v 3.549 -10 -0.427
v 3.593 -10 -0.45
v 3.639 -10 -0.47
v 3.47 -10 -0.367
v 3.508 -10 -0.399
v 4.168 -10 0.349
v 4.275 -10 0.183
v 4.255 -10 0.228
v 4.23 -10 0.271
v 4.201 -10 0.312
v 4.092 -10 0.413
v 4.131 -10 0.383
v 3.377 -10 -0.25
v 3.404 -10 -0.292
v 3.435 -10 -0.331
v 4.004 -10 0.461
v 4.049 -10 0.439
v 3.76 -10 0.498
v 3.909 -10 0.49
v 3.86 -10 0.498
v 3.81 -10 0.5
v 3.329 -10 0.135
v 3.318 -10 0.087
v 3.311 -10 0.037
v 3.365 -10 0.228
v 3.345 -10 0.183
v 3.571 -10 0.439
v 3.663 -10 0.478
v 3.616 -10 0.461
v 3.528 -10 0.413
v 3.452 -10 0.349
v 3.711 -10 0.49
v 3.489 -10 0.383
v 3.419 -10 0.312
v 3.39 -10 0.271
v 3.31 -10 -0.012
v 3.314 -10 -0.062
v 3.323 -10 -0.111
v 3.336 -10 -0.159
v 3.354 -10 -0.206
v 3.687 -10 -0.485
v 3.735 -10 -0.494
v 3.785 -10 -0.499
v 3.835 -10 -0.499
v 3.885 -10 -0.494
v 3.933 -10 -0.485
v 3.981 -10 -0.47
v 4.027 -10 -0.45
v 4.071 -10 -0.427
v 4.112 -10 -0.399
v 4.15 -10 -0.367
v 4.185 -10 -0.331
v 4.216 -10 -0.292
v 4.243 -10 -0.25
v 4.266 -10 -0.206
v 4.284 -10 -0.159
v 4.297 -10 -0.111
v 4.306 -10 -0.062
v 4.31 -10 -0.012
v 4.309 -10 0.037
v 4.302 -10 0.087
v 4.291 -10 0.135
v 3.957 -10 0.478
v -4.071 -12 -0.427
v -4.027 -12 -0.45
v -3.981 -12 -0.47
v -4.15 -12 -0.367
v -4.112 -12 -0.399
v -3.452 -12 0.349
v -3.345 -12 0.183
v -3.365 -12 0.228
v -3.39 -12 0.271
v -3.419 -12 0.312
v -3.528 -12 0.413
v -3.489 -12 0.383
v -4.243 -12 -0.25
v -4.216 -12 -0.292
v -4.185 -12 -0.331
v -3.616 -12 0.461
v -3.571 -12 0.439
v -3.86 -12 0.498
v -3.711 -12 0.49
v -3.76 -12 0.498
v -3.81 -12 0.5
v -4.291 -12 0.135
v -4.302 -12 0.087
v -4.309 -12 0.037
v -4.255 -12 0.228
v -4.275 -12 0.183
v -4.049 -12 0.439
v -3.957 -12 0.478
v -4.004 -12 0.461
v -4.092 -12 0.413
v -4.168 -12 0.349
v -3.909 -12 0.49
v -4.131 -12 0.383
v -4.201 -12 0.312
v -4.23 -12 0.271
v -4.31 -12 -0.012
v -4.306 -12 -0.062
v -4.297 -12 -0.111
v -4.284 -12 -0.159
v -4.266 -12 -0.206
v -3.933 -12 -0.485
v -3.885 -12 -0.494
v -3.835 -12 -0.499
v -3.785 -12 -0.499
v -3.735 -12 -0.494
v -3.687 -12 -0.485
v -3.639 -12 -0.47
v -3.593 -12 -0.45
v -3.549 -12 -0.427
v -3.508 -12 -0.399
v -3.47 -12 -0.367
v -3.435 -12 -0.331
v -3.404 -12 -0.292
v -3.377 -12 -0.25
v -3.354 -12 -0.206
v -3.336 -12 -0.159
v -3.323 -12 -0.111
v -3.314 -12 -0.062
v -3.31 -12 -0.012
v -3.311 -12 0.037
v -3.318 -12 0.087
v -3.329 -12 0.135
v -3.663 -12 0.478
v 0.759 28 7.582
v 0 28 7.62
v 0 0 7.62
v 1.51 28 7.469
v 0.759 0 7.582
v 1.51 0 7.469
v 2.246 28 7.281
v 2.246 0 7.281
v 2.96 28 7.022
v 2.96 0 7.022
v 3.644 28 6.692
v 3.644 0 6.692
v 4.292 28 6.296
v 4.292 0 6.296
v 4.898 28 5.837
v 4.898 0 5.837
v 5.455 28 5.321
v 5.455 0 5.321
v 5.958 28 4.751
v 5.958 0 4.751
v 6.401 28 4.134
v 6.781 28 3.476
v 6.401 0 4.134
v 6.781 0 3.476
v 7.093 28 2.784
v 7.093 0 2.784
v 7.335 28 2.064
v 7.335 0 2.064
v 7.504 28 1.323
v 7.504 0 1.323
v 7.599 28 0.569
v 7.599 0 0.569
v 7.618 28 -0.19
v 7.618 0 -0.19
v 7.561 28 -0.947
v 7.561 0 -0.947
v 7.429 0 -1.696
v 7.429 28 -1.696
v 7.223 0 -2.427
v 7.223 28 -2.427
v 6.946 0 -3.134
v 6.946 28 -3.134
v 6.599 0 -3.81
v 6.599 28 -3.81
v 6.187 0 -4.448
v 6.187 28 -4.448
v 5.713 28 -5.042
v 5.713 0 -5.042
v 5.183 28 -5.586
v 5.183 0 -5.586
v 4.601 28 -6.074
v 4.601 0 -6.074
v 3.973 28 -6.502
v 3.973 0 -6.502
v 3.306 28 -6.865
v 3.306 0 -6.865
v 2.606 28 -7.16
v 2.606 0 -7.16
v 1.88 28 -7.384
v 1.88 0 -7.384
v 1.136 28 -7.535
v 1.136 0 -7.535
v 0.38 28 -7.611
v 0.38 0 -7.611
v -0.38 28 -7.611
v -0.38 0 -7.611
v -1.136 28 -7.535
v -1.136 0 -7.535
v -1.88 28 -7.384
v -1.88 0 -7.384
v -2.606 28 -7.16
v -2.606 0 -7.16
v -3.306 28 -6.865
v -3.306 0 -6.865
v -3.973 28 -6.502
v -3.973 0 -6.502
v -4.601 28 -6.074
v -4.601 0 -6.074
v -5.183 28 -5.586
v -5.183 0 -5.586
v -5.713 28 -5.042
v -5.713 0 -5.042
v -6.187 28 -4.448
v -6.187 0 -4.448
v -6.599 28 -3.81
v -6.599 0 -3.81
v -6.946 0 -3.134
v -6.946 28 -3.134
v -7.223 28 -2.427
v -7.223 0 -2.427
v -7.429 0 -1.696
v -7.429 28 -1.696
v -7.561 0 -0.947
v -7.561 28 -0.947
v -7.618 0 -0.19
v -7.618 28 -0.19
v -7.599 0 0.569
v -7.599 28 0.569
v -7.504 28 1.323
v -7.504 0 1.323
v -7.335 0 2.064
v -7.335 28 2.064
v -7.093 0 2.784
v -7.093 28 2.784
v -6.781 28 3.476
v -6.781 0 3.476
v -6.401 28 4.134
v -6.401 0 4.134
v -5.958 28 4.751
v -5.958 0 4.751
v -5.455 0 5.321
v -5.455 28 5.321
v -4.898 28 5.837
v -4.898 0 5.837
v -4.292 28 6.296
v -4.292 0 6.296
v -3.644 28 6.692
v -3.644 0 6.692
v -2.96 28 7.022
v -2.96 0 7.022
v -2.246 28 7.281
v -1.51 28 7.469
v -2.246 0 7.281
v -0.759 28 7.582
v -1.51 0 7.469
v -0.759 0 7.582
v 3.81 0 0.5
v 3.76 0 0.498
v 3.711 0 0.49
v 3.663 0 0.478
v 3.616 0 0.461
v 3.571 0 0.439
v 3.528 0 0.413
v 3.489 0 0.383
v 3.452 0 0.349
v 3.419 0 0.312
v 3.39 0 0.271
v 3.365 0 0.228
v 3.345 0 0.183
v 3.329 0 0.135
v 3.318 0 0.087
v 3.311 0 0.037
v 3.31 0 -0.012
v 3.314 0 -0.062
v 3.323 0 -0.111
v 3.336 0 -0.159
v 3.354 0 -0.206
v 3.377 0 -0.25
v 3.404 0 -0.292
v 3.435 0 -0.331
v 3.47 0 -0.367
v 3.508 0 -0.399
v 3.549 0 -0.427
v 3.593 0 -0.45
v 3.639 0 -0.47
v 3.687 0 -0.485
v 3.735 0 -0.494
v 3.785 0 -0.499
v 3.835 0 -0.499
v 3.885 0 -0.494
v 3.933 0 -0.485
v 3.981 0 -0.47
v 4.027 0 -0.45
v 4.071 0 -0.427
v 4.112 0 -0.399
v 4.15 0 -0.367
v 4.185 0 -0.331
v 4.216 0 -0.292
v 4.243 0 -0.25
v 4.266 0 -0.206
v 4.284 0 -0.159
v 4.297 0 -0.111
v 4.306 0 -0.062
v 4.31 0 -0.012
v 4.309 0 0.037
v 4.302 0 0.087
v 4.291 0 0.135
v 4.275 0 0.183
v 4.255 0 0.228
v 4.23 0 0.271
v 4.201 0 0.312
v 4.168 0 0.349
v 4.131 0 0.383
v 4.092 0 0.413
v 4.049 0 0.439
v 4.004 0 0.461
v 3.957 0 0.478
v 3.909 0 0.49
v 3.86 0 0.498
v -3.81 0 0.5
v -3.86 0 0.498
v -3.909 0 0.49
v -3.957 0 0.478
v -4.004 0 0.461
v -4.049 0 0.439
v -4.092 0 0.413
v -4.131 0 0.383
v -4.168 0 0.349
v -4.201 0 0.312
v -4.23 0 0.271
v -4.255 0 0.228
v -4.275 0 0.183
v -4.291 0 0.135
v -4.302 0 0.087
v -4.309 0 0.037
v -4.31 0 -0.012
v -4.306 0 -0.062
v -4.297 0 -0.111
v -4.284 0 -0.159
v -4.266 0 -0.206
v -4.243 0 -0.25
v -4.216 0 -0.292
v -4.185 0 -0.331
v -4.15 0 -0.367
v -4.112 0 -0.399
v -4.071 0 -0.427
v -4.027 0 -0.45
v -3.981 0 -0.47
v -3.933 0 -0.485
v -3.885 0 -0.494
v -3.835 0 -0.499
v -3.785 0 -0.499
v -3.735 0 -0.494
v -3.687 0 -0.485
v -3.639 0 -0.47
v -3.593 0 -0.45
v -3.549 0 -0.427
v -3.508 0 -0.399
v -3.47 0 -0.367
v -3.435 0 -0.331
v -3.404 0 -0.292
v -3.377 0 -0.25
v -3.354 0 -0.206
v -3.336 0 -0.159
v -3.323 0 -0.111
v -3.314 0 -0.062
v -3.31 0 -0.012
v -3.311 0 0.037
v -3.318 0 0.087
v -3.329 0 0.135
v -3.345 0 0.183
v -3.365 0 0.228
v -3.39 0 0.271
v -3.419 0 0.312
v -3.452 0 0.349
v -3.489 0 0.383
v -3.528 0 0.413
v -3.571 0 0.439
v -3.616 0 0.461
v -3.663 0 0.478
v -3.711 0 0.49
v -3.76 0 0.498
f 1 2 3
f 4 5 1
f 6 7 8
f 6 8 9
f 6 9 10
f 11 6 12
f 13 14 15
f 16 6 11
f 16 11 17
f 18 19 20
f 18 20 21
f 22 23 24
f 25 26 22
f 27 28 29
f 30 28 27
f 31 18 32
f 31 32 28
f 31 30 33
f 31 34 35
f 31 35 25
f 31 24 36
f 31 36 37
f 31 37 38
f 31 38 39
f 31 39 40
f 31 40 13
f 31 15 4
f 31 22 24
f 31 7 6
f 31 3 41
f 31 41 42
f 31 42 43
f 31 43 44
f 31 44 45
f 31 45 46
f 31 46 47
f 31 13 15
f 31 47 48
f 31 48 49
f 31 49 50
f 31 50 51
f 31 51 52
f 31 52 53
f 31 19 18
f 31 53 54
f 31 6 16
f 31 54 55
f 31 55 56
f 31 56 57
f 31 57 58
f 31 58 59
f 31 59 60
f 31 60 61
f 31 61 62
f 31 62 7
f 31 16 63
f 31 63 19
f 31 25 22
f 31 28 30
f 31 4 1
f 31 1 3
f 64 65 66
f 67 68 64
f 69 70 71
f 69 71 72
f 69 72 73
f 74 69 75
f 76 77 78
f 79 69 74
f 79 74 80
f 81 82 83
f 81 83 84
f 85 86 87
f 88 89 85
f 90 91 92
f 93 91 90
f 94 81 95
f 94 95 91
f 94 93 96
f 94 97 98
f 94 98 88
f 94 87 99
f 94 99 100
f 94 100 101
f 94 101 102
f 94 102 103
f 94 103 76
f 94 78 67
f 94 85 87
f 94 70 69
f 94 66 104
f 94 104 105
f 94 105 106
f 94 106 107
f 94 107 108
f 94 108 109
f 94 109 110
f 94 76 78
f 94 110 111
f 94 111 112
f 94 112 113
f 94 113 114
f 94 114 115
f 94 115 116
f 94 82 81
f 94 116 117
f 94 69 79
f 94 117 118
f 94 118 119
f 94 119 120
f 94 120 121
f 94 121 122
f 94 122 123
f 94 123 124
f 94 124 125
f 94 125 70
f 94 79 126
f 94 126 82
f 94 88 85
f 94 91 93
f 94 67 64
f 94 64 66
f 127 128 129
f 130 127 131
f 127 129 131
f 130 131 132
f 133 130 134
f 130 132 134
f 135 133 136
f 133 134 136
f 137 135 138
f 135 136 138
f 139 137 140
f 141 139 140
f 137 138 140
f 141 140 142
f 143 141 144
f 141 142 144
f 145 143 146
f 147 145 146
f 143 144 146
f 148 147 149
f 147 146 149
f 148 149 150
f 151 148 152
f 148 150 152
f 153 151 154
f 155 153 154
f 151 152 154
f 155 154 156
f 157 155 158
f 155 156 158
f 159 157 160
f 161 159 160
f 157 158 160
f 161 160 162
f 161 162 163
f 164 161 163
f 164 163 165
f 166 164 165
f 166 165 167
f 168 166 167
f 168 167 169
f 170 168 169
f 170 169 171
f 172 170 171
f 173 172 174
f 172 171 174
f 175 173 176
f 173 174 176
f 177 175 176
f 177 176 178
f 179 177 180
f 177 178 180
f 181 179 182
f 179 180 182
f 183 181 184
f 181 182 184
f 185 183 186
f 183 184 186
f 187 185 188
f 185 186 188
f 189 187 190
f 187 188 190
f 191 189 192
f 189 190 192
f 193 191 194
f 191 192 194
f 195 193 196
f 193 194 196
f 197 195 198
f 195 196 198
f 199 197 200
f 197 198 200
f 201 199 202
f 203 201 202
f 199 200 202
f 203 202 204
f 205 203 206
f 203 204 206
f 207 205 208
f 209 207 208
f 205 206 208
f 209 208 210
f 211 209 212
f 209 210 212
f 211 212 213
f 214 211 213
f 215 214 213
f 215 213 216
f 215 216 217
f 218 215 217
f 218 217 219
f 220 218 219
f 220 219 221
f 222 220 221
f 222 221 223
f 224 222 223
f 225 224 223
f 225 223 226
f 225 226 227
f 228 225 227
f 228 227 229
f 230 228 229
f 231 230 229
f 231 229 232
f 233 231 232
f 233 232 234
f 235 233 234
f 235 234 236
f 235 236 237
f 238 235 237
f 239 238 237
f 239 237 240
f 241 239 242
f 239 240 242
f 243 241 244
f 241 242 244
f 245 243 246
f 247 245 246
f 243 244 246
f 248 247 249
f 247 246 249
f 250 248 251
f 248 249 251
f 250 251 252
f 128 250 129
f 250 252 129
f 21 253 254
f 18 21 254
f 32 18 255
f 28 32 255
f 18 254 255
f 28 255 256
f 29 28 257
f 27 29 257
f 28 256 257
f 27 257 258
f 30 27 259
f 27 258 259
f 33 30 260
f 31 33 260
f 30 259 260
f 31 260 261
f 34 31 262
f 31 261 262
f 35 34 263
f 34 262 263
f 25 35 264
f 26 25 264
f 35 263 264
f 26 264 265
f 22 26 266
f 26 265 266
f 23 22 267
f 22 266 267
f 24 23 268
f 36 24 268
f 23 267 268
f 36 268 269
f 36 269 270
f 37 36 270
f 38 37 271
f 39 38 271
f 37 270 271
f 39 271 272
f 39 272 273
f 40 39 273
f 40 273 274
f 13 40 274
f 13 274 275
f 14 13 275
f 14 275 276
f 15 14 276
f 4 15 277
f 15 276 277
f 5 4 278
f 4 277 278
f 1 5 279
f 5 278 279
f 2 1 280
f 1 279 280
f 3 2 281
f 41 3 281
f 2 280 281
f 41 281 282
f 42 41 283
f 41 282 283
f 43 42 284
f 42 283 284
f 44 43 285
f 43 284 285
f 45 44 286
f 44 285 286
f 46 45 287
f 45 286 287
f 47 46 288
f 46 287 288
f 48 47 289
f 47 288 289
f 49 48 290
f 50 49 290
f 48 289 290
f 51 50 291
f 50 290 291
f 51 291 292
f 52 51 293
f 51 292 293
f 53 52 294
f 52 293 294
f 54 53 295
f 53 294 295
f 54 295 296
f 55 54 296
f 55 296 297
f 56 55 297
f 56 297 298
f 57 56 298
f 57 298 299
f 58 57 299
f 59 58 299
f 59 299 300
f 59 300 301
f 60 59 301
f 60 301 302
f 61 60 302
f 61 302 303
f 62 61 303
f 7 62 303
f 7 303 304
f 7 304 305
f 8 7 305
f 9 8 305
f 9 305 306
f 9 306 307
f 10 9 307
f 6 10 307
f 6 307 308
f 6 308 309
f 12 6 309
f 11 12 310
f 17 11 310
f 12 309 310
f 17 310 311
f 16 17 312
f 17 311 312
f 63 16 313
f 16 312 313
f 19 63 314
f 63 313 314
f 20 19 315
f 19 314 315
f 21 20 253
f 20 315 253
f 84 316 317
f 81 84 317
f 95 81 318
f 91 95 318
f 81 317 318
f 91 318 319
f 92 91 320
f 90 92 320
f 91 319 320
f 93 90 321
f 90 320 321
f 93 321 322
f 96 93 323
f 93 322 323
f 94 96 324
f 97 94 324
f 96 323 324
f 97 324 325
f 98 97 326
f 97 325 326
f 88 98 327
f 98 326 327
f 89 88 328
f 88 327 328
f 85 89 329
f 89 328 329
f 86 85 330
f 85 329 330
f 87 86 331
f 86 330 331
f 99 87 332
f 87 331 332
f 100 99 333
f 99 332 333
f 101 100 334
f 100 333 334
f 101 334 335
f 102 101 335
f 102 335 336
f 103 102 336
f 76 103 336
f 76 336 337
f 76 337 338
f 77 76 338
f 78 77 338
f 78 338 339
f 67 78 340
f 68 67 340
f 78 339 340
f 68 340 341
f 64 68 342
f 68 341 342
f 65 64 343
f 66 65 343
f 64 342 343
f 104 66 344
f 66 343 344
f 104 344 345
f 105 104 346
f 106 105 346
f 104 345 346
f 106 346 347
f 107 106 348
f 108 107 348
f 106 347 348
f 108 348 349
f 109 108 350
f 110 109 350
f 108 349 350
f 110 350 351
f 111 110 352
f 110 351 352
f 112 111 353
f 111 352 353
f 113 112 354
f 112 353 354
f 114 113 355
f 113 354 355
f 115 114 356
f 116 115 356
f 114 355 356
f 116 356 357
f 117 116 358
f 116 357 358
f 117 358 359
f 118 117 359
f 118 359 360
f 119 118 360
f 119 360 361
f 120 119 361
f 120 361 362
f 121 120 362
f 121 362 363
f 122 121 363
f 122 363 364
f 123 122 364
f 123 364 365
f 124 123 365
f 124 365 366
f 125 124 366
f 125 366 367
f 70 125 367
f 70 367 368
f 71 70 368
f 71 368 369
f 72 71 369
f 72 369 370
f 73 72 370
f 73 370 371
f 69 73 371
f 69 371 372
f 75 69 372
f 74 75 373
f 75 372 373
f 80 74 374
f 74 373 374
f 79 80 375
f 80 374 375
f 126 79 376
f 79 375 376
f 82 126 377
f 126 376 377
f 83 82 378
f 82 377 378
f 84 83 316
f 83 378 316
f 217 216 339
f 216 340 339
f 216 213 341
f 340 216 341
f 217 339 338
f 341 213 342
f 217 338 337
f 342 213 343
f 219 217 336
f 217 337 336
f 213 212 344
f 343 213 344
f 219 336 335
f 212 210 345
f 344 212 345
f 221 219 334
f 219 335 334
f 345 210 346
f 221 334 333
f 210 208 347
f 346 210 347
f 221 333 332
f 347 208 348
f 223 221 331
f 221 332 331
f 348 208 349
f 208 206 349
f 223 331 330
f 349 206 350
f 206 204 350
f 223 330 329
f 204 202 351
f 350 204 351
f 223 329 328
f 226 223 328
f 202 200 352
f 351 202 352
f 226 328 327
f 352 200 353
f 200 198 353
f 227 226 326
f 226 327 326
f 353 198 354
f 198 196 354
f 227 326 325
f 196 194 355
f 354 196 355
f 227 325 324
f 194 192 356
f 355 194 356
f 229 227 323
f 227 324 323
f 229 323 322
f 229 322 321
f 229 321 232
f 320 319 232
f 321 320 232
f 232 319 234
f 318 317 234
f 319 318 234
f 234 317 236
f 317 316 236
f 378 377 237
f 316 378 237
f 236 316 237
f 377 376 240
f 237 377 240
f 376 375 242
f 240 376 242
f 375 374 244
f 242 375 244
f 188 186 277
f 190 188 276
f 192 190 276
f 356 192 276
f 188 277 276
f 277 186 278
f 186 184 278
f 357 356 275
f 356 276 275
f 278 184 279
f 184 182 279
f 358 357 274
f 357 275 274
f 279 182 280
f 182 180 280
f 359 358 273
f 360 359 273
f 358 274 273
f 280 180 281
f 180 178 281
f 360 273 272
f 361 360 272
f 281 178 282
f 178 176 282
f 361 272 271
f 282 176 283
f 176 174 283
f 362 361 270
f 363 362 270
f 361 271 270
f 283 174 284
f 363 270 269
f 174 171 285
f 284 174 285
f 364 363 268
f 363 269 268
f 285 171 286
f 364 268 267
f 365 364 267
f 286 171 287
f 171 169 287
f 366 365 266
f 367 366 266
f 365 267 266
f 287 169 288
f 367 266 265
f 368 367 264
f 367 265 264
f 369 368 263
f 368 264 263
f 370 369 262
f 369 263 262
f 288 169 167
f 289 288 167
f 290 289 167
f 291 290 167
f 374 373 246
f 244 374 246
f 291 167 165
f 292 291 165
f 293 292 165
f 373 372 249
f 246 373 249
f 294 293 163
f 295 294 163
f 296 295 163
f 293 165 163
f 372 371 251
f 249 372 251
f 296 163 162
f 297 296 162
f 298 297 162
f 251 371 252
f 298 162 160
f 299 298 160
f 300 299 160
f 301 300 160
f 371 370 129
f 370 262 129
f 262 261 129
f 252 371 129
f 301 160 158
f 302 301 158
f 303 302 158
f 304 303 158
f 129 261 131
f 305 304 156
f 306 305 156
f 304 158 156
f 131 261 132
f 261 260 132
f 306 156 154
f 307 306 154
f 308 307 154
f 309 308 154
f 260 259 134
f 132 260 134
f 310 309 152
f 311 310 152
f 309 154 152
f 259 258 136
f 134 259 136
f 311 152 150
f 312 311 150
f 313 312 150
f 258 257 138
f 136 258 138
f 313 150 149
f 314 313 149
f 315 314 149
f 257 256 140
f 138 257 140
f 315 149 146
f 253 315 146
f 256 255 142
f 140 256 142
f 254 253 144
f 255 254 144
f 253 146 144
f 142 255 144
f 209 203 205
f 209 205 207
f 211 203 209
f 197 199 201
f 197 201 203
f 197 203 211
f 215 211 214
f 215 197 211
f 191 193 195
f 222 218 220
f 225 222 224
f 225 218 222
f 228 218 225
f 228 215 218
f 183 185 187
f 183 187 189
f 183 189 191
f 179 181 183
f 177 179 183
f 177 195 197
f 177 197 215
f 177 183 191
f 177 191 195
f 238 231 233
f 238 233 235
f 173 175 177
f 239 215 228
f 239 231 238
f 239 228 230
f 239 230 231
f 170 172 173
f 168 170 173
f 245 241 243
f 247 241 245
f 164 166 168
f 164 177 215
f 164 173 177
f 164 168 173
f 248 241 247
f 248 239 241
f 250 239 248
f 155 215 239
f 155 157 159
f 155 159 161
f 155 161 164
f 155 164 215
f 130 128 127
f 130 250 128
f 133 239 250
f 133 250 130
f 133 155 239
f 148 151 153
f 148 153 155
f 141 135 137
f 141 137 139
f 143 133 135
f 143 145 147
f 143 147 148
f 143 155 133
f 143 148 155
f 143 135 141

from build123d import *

# Parameters (mm, degrees)
SKETCH_1_R      = 7.62
EXTRUDE_1_DEPTH = 28
SKETCH_2_R      = 0.5
EXTRUDE_2_DEPTH = 12
SKETCH_3_R      = 0.5
EXTRUDE_3_DEPTH = 10


with BuildPart() as part:
    # 草图1 → 拉伸1 (new body)
    with BuildSketch(Plane(origin=(0, 0, 0), x_dir=(1, 0, 0), z_dir=(0, 1, 0))):
        with Locations(Location((0, 0, 0), (0, 0, 270))):
            Circle(SKETCH_1_R)
    extrude(amount=EXTRUDE_1_DEPTH)

    # 草图2 → 拉伸2 (add)
    with BuildSketch(Plane.XZ):
        with Locations(Location((-3.81, 0, 0), (0, 0, 90))):
            Circle(SKETCH_2_R)
    extrude(amount=EXTRUDE_2_DEPTH)

    # 草图3 → 拉伸3 (add)
    with BuildSketch(Plane.XZ):
        with Locations(Location((3.81, 0, 0), (0, 0, 90))):
            Circle(SKETCH_3_R)
    extrude(amount=EXTRUDE_3_DEPTH)


solid = part.part
